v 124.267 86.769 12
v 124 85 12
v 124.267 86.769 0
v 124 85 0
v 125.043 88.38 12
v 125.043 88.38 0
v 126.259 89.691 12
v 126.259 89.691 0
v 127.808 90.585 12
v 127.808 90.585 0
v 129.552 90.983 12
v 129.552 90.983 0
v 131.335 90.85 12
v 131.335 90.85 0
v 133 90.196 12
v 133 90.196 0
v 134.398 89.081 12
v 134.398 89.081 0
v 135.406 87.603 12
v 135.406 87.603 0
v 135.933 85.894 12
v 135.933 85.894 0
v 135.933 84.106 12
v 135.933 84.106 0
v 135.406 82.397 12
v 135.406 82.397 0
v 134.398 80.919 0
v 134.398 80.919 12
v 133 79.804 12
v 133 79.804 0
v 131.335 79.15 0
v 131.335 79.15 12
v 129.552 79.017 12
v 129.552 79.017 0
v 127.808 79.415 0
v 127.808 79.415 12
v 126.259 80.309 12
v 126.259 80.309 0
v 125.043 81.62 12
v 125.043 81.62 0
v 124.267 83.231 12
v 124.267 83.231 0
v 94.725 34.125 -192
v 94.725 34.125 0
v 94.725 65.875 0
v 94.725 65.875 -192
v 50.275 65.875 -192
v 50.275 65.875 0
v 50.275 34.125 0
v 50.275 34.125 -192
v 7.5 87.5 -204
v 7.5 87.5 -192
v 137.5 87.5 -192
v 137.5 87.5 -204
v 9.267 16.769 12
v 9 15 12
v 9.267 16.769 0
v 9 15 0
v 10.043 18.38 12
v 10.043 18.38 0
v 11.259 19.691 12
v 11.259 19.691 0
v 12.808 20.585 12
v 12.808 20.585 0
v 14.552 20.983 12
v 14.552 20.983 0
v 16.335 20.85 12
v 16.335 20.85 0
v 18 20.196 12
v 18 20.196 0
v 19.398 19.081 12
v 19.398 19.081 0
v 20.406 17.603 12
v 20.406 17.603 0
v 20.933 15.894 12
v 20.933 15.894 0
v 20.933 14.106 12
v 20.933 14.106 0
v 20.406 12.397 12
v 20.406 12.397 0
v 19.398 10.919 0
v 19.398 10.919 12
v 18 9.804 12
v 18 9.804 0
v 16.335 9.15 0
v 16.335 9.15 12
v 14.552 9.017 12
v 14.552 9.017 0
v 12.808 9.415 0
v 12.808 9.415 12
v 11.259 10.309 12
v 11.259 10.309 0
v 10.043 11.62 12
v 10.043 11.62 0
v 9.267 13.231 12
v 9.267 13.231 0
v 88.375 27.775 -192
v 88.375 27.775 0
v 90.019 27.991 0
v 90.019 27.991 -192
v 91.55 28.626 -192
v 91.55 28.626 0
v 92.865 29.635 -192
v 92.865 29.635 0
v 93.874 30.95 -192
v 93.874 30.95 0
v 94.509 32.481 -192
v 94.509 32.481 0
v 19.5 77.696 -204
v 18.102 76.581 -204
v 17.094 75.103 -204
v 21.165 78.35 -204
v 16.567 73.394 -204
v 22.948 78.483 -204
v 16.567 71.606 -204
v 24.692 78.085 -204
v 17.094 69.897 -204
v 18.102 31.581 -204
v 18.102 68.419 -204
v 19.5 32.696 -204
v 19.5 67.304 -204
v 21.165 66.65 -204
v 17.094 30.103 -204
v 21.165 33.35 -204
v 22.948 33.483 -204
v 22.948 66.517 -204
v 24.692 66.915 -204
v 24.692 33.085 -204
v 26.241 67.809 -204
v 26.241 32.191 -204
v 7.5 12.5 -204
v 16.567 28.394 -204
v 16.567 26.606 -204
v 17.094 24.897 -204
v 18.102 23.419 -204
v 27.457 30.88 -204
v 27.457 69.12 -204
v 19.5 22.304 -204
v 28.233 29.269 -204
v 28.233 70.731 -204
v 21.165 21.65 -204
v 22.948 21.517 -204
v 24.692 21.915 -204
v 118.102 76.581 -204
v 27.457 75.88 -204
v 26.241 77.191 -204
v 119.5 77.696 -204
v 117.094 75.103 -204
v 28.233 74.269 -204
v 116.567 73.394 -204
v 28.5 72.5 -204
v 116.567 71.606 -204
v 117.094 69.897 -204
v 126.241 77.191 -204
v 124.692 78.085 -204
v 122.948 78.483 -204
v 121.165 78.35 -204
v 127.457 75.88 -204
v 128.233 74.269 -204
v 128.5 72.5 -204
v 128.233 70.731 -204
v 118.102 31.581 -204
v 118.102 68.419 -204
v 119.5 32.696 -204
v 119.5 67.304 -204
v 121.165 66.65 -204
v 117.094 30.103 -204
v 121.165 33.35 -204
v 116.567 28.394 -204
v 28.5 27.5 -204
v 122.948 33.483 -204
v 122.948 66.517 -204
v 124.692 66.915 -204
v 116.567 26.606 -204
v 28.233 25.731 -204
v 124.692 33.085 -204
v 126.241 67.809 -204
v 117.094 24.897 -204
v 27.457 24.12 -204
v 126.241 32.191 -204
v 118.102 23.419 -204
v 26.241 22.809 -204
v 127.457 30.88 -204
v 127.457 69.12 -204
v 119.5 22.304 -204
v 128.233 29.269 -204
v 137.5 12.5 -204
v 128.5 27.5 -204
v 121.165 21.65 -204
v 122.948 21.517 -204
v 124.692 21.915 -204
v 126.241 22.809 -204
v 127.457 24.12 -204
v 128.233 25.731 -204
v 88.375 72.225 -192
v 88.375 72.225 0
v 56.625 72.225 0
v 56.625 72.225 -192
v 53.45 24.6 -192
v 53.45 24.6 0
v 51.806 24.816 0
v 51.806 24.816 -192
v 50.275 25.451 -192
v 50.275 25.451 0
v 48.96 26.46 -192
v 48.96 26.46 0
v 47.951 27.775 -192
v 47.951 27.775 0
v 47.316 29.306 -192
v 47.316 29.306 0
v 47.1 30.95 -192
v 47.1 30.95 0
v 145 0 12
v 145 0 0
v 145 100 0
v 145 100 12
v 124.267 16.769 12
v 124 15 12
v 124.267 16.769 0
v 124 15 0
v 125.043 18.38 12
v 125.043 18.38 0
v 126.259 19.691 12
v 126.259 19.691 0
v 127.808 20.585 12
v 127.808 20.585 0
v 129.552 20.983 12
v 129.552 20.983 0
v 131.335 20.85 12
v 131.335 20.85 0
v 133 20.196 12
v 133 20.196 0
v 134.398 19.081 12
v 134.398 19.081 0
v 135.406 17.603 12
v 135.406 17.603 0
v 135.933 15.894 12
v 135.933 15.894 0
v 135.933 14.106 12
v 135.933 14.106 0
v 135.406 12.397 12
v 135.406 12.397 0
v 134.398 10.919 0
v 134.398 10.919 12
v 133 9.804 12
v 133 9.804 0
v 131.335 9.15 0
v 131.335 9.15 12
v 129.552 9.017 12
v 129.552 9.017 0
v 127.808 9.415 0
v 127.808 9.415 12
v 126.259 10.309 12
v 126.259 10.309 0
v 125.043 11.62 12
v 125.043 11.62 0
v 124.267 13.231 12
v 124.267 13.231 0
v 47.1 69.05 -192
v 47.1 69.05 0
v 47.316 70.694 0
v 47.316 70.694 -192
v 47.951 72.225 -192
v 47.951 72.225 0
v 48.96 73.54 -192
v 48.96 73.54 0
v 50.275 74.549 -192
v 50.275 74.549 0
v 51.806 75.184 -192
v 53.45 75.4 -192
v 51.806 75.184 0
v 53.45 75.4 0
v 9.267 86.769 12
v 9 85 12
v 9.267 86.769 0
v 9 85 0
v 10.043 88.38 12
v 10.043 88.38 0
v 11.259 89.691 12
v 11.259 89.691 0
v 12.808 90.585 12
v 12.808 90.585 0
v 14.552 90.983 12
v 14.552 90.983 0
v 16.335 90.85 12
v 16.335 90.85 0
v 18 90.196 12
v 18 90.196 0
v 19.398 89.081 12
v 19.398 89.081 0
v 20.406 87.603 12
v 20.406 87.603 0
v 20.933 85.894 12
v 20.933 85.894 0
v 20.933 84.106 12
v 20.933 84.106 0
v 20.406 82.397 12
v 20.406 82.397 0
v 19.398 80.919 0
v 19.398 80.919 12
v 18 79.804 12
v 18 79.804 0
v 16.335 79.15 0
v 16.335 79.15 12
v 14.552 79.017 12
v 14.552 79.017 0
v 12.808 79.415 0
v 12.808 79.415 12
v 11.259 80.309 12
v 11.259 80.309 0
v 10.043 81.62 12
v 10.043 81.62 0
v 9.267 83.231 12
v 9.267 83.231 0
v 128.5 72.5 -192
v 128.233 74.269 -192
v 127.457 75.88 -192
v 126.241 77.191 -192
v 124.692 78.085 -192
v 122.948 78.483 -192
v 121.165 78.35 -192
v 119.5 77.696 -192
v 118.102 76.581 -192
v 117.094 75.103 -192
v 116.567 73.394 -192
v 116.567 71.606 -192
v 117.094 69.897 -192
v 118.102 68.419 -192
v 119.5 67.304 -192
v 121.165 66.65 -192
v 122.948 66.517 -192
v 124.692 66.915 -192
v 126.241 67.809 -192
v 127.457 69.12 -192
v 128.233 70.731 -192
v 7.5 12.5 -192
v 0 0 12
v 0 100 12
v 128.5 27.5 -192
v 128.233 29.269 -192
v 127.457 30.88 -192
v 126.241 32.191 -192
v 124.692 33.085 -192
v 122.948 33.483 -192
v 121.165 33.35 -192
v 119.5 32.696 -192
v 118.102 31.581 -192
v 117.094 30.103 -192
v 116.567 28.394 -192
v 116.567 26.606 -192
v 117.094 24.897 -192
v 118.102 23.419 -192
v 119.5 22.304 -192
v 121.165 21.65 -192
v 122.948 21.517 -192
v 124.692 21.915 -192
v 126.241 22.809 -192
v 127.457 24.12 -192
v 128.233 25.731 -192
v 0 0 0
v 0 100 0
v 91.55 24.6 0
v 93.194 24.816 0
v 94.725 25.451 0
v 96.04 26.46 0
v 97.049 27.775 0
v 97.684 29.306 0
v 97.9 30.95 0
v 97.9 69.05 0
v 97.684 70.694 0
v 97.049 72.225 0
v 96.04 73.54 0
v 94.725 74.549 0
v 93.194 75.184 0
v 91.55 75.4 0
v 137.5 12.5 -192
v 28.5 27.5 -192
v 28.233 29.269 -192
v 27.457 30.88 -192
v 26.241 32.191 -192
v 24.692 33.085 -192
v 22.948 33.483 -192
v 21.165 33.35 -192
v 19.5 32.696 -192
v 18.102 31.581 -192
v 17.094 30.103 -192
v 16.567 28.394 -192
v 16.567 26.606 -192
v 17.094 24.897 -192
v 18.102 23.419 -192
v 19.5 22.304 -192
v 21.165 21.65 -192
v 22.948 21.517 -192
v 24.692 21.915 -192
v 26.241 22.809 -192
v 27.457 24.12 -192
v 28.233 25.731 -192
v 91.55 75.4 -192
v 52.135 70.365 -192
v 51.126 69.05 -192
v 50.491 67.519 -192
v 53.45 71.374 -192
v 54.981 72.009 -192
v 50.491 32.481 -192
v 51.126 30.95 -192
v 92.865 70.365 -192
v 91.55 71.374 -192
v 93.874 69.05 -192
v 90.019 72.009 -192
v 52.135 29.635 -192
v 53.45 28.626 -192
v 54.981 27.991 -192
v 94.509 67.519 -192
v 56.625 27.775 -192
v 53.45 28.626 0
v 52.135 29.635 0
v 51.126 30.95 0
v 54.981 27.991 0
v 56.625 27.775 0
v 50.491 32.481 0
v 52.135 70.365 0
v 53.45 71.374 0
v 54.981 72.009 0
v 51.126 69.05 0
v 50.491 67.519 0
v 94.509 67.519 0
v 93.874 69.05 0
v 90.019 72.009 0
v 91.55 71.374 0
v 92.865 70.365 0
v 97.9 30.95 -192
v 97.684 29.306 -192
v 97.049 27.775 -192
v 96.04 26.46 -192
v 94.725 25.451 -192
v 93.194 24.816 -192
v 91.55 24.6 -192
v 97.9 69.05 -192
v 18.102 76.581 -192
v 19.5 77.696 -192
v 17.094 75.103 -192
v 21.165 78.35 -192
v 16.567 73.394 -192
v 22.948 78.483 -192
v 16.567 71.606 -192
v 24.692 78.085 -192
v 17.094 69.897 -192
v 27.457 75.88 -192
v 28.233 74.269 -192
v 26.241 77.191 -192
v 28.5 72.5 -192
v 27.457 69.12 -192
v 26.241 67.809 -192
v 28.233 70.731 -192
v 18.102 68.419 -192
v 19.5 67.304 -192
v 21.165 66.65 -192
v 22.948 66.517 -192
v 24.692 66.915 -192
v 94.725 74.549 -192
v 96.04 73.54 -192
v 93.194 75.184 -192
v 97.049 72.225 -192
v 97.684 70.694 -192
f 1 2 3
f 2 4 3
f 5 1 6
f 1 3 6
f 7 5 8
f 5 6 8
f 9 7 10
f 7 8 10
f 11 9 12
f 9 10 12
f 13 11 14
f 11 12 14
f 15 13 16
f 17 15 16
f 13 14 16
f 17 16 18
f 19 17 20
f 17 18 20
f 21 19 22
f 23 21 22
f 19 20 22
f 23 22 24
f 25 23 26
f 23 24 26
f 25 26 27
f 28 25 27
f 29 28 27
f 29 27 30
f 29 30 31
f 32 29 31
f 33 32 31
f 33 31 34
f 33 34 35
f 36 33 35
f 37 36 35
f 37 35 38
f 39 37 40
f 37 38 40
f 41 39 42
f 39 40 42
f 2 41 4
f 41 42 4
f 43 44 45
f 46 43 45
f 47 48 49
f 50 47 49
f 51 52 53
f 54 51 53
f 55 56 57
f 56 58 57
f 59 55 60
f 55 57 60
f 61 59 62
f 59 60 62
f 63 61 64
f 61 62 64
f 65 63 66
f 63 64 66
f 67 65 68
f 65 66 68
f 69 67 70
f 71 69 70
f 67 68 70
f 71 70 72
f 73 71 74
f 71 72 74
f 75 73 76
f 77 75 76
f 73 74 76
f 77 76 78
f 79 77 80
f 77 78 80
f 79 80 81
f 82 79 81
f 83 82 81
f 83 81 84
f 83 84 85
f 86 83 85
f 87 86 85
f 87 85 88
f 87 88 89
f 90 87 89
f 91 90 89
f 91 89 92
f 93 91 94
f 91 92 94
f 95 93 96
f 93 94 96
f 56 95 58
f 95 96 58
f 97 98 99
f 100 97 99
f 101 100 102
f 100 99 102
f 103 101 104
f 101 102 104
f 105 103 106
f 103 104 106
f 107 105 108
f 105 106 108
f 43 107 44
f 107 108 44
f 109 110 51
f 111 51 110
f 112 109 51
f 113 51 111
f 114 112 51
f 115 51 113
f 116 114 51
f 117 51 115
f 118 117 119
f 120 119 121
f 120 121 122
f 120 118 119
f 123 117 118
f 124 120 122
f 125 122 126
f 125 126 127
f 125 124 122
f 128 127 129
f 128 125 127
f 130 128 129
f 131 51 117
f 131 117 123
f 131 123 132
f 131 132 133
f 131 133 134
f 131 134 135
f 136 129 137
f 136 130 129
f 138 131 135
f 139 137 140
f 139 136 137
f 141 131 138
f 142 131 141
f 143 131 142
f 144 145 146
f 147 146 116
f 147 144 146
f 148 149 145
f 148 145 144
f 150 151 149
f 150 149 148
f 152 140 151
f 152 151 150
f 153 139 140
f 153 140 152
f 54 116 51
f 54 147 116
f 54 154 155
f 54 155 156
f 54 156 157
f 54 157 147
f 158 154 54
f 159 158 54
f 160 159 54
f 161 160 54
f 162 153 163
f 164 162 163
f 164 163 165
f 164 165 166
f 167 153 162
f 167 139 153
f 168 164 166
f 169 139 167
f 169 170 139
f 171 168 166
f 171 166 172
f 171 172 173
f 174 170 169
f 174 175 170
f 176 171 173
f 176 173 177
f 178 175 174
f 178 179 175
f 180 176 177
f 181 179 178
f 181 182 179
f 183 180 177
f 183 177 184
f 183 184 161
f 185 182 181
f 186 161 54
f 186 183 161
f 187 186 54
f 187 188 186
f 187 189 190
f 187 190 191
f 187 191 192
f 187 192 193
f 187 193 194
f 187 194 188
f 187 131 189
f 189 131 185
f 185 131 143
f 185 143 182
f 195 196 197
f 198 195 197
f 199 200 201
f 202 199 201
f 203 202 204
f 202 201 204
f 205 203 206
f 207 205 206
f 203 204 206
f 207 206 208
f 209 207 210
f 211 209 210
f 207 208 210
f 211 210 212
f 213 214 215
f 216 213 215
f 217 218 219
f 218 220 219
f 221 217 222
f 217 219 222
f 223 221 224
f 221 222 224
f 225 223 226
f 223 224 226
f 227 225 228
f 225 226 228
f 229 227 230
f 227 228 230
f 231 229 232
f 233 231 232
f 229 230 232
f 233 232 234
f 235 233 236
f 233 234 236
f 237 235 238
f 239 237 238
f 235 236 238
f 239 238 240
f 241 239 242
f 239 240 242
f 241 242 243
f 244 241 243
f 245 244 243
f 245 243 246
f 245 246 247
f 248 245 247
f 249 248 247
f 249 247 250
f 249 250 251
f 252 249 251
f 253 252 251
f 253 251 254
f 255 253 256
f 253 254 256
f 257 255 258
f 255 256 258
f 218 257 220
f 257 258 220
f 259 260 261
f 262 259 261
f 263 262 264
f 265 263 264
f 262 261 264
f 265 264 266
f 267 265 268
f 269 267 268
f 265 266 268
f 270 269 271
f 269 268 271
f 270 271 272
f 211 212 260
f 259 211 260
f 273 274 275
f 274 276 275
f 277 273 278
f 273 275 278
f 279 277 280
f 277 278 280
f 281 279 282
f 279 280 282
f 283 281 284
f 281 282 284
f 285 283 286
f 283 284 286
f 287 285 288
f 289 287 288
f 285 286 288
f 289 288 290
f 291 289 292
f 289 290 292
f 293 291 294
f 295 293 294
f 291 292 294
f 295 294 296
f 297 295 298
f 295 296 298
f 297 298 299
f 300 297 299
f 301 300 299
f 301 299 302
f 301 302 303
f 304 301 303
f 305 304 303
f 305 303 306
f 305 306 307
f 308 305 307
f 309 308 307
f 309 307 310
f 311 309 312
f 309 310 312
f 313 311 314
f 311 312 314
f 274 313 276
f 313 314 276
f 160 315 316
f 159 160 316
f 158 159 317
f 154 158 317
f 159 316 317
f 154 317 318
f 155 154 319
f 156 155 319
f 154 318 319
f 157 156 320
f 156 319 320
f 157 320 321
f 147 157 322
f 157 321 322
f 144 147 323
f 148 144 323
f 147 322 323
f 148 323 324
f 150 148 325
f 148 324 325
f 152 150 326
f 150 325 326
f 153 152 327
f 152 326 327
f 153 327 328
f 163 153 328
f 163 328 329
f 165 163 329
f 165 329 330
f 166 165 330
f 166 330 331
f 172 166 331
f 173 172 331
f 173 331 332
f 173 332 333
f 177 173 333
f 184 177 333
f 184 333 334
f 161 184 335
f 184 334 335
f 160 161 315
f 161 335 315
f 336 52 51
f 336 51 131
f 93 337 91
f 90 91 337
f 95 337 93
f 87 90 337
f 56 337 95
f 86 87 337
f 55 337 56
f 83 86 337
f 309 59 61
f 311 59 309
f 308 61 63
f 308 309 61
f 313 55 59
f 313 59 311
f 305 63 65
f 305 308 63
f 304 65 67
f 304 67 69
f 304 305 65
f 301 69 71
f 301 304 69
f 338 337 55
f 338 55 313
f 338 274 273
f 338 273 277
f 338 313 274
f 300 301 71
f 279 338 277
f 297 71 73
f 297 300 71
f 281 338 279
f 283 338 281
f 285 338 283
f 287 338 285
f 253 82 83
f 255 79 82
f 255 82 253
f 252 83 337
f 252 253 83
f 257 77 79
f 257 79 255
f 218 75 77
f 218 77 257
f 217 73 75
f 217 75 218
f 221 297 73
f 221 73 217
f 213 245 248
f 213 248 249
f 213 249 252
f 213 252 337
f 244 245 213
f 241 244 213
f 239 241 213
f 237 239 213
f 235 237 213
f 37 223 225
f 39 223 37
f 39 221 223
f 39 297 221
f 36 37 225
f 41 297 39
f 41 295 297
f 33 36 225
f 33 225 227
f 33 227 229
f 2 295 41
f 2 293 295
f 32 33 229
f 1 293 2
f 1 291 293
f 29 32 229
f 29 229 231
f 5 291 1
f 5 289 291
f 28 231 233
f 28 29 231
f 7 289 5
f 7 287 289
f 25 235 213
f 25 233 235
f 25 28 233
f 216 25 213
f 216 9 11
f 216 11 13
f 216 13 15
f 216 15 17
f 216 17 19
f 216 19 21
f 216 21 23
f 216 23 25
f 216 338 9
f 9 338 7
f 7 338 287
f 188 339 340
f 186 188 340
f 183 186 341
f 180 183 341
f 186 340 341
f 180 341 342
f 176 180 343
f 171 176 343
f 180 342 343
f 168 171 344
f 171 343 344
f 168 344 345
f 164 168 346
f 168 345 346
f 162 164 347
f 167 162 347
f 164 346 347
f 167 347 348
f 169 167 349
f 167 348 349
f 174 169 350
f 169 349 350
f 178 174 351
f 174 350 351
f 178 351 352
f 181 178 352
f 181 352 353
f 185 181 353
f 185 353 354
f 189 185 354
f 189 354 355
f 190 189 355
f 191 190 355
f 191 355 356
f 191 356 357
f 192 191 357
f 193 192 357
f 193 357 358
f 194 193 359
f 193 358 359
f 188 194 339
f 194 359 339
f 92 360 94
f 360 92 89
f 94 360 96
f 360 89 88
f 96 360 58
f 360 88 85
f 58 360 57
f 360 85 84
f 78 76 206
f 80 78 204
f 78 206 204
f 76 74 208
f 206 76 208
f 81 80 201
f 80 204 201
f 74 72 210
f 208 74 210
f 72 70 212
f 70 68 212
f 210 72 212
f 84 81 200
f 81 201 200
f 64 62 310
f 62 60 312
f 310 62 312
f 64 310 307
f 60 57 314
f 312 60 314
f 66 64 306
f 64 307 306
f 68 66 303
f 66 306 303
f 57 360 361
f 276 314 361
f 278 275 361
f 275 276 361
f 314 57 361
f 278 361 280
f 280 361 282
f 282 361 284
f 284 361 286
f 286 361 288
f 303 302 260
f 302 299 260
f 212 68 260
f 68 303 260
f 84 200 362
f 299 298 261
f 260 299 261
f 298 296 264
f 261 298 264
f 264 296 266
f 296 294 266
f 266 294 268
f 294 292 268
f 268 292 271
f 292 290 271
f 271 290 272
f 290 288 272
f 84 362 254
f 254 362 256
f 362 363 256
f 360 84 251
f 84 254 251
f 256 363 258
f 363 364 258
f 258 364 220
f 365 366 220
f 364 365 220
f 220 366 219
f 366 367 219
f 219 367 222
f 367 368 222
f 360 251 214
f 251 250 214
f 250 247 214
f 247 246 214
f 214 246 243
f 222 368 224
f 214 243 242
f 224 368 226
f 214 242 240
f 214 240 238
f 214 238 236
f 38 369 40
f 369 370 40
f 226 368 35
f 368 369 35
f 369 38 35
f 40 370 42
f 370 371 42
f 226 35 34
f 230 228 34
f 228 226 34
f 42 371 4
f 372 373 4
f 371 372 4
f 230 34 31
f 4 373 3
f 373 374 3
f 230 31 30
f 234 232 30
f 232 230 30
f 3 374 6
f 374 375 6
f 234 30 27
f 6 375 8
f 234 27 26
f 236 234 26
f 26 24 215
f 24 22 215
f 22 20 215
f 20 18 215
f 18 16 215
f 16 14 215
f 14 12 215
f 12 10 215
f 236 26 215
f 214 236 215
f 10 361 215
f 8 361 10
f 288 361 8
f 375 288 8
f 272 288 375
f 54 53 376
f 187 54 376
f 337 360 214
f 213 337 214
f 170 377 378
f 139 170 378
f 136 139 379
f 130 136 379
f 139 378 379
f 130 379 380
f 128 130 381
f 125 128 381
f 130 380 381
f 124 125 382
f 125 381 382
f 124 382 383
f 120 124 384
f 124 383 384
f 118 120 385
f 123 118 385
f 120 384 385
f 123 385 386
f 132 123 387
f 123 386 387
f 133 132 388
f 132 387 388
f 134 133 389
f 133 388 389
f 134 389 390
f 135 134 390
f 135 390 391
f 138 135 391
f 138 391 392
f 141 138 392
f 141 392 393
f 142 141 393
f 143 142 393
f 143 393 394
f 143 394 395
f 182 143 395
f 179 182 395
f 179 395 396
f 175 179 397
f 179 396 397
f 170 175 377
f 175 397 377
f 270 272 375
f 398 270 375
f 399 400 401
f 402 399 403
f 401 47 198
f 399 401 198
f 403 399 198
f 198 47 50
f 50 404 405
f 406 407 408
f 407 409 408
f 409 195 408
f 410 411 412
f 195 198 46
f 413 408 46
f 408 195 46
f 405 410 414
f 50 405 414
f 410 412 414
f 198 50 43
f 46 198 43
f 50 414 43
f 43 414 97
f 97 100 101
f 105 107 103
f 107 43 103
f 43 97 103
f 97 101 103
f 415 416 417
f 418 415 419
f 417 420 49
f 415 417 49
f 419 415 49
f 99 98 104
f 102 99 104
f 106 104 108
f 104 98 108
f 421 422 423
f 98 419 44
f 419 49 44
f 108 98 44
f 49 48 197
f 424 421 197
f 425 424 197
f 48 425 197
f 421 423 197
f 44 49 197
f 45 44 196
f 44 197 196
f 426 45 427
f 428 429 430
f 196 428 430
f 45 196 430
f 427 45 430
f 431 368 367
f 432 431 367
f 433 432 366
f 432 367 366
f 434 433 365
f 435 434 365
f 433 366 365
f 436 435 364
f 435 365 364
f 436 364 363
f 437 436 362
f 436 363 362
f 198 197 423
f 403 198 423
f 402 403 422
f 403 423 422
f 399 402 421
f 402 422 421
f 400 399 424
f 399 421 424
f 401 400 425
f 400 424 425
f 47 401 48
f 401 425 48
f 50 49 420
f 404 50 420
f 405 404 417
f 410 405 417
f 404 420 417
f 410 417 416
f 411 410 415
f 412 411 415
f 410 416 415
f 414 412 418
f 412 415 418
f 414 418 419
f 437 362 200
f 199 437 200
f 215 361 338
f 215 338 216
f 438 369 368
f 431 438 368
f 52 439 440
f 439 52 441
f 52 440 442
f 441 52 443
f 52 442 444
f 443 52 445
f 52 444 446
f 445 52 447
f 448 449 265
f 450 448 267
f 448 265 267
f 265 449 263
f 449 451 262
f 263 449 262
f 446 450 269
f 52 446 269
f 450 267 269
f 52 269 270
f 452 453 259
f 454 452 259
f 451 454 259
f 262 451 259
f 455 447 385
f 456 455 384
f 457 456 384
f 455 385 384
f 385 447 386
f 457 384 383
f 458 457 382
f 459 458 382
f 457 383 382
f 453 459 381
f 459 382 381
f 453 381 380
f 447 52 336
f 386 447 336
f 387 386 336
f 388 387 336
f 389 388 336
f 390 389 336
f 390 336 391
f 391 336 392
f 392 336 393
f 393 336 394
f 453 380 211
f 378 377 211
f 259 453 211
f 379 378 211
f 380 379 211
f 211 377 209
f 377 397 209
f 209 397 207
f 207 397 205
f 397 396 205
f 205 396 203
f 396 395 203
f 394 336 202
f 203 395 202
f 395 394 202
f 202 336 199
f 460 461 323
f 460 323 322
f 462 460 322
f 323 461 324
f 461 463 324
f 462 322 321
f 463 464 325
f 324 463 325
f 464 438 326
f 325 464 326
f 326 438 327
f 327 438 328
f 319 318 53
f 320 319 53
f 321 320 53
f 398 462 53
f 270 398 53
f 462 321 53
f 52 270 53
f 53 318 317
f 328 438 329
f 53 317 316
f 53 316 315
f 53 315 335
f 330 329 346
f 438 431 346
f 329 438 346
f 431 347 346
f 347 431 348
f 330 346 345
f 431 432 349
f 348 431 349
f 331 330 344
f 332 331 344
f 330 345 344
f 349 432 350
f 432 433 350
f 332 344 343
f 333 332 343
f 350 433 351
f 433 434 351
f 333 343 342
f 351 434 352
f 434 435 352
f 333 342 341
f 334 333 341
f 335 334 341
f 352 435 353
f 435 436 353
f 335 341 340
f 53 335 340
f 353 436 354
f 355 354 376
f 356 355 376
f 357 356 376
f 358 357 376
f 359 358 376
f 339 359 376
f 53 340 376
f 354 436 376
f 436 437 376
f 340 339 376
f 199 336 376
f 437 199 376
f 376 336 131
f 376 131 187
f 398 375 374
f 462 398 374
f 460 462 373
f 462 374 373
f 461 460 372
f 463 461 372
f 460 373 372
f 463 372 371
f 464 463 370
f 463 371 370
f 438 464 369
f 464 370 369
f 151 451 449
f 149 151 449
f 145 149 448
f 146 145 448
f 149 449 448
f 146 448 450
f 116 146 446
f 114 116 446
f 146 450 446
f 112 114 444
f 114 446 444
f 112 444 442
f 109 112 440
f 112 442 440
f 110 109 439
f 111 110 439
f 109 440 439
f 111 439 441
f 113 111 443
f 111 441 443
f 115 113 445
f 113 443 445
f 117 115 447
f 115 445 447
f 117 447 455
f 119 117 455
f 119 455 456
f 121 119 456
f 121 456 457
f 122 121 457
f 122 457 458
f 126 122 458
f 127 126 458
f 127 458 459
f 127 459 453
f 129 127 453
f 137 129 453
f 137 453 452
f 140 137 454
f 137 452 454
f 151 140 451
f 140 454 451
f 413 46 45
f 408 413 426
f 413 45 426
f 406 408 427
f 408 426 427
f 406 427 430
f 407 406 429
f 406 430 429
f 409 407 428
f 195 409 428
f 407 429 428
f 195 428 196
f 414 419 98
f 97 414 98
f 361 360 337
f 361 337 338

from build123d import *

# Parameters (mm, degrees)
F0_W     = 145
F0_H     = 100
F1_DEPTH = 12
F3_DEPTH = 192
F4_W     = 130
F4_H     = 75
F5_DEPTH = 12
F7_D     = 12
F7_DEPTH = 12
F7_TIP   = 3.6051637142
F9_D     = 12
F9_DEPTH = 12
F9_TIP   = 3.6051637142


with BuildPart() as f1:
    # F0 (on Top) → F1 (new body)
    with BuildSketch(Plane.XY):
        with Locations((72.5, 50)):
            Rectangle(F0_W, F0_H)
    extrude(amount=F1_DEPTH)

    # F2 (on face) → F3 (join)
    with BuildSketch(Plane(origin=(0, 0, 0), x_dir=(1, 0, 0), z_dir=(0, 0, -1))):
        with BuildLine():
            ThreePointArc((97.9, -30.95), (96.0401280605, -26.4598719395), (91.55, -24.6))
            Line((91.55, -24.6), (53.45, -24.6))
            ThreePointArc((53.45, -24.6), (48.9598719395, -26.4598719395), (47.1, -30.95))
            Line((47.1, -30.95), (47.1, -69.05))
            ThreePointArc((47.1, -69.05), (48.9598719395, -73.5401280605), (53.45, -75.4))
            Line((53.45, -75.4), (91.55, -75.4))
            ThreePointArc((91.55, -75.4), (96.0401280605, -73.5401280605), (97.9, -69.05))
            Line((97.9, -69.05), (97.9, -30.95))
        make_face()
        with BuildLine():
            Line((56.625, -27.775), (88.375, -27.775))
            ThreePointArc((88.375, -27.775), (92.8651280605, -29.6348719395), (94.725, -34.125))
            Line((94.725, -34.125), (94.725, -65.875))
            ThreePointArc((94.725, -65.875), (92.8651280605, -70.3651280605), (88.375, -72.225))
            Line((88.375, -72.225), (56.625, -72.225))
            ThreePointArc((56.625, -72.225), (52.1348719395, -70.3651280605), (50.275, -65.875))
            Line((50.275, -65.875), (50.275, -34.125))
            ThreePointArc((50.275, -34.125), (52.1348719395, -29.6348719395), (56.625, -27.775))
        make_face(mode=Mode.SUBTRACT)
    extrude(amount=F3_DEPTH)

    # F4 (on face) → F5 (join)
    with BuildSketch(Plane(origin=(0, 0, -192), x_dir=(1, 0, 0), z_dir=(0, 0, -1))):
        with Locations((72.5, -50)):
            Rectangle(F4_W, F4_H)
        with BuildLine():
            ThreePointArc((91.55, -24.6), (96.0401280605, -26.4598719395), (97.9, -30.95))
            Line((97.9, -30.95), (97.9, -69.05))
            ThreePointArc((97.9, -69.05), (96.0401280605, -73.5401280605), (91.55, -75.4))
            Line((91.55, -75.4), (53.45, -75.4))
            ThreePointArc((53.45, -75.4), (48.9598719395, -73.5401280605), (47.1, -69.05))
            Line((47.1, -69.05), (47.1, -30.95))
            ThreePointArc((47.1, -30.95), (48.9598719395, -26.4598719395), (53.45, -24.6))
            Line((53.45, -24.6), (91.55, -24.6))
        make_face(mode=Mode.SUBTRACT)
        with BuildLine():
            Line((97.9, -69.05), (97.9, -30.95))
            ThreePointArc((97.9, -30.95), (96.0401280605, -26.4598719395), (91.55, -24.6))
            Line((91.55, -24.6), (53.45, -24.6))
            ThreePointArc((53.45, -24.6), (48.9598719395, -26.4598719395), (47.1, -30.95))
            Line((47.1, -30.95), (47.1, -69.05))
            ThreePointArc((47.1, -69.05), (48.9598719395, -73.5401280605), (53.45, -75.4))
            Line((53.45, -75.4), (91.55, -75.4))
            ThreePointArc((91.55, -75.4), (96.0401280605, -73.5401280605), (97.9, -69.05))
        make_face()
        with BuildLine():
            ThreePointArc((50.275, -34.125), (52.1348719395, -29.6348719395), (56.625, -27.775))
            Line((56.625, -27.775), (88.375, -27.775))
            ThreePointArc((88.375, -27.775), (92.8651280605, -29.6348719395), (94.725, -34.125))
            Line((94.725, -34.125), (94.725, -65.875))
            ThreePointArc((94.725, -65.875), (92.8651280605, -70.3651280605), (88.375, -72.225))
            Line((88.375, -72.225), (56.625, -72.225))
            ThreePointArc((56.625, -72.225), (52.1348719395, -70.3651280605), (50.275, -65.875))
            Line((50.275, -65.875), (50.275, -34.125))
        make_face(mode=Mode.SUBTRACT)
        with BuildLine():
            Line((88.375, -27.775), (56.625, -27.775))
            ThreePointArc((56.625, -27.775), (52.1348719395, -29.6348719395), (50.275, -34.125))
            Line((50.275, -34.125), (50.275, -65.875))
            ThreePointArc((50.275, -65.875), (52.1348719395, -70.3651280605), (56.625, -72.225))
            Line((56.625, -72.225), (88.375, -72.225))
            ThreePointArc((88.375, -72.225), (92.8651280605, -70.3651280605), (94.725, -65.875))
            Line((94.725, -65.875), (94.725, -34.125))
            ThreePointArc((94.725, -34.125), (92.8651280605, -29.6348719395), (88.375, -27.775))
        make_face()
    extrude(amount=F5_DEPTH)

    # F7 (one way)
    with BuildSketch(Plane.XY.offset(-192)):
        with Locations((122.5, 72.5), (122.5, 27.5), (22.5, 27.5), (22.5, 72.5)):
            Circle(F7_D / 2)
    extrude(amount=-F7_DEPTH, mode=Mode.SUBTRACT)
    with Locations(Plane.XY.offset(-192)):
        with Locations((122.5, 72.5), (122.5, 27.5), (22.5, 27.5), (22.5, 72.5)):
            with Locations((0, 0, -(F7_DEPTH + F7_TIP / 2))):  # 118° drill point
                Cone(0, F7_D / 2, F7_TIP, mode=Mode.SUBTRACT)

    # F9
    with Locations(Plane.XY.offset(12)):
        with Locations((15, 85), (130, 85), (130, 15), (15, 15)):
            Hole(F9_D / 2, depth=F9_DEPTH)
            with Locations((0, 0, -(F9_DEPTH + F9_TIP / 2))):  # 118° drill point
                Cone(0, F9_D / 2, F9_TIP, mode=Mode.SUBTRACT)


solid = f1.part
